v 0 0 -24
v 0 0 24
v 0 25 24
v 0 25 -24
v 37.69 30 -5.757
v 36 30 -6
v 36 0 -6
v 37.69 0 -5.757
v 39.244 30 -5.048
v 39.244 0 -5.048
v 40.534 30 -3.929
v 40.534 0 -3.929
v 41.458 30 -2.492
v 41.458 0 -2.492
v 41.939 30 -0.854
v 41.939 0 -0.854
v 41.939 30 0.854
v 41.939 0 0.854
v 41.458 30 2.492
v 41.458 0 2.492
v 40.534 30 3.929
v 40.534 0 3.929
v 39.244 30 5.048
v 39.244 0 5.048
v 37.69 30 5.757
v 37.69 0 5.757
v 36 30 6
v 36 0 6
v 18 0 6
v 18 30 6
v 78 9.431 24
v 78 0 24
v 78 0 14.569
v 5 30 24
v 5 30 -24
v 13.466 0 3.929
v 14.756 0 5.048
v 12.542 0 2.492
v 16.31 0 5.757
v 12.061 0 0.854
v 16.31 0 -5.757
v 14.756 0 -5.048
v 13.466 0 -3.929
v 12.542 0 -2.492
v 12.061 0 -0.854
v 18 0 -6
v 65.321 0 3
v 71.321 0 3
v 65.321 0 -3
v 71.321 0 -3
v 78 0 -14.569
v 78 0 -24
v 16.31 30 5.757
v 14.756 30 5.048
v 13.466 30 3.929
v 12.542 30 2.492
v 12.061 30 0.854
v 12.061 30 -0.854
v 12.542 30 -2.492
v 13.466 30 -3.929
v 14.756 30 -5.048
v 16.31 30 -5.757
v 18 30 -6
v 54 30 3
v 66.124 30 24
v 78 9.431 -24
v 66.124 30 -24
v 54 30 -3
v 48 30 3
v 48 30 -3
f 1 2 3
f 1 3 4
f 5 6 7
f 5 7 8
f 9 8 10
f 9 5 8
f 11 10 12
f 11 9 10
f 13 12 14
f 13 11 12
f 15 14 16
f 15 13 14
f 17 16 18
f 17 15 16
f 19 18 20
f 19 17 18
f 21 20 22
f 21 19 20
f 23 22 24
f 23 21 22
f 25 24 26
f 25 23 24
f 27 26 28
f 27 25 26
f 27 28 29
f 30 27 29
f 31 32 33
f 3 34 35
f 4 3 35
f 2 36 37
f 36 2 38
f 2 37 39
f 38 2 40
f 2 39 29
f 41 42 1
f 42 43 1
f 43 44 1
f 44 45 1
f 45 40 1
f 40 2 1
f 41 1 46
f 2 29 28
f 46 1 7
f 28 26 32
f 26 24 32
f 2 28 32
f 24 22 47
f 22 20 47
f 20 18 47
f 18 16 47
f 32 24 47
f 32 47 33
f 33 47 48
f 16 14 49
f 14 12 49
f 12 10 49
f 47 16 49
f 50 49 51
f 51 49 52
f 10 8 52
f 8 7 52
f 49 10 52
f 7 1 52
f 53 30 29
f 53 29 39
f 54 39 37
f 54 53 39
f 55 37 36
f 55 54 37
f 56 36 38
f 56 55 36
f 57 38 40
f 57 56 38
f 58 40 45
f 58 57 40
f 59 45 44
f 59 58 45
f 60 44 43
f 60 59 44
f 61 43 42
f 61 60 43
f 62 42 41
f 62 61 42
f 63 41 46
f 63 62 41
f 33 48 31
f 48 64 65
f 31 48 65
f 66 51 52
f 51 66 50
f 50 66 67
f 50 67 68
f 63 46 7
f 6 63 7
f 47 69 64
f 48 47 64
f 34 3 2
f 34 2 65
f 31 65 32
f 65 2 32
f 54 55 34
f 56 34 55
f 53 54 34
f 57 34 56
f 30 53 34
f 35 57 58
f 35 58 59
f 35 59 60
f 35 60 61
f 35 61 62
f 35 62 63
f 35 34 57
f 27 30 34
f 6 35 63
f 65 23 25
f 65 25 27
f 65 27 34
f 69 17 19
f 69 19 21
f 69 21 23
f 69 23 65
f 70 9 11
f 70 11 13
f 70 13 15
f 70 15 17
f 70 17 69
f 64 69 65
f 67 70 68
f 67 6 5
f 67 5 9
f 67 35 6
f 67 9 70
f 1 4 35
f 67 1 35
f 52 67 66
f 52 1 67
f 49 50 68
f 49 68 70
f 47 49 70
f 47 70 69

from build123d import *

# Parameters (mm, degrees)
SKETCH1_W           = 78
SKETCH1_H           = 48
BOSS_EXTRUDE1_DEPTH = 30
CHAMFER1_SIZE       = 5
CUT_EXTRUDE1_DEPTH  = 87.948260477
CUT_EXTRUDE2_DEPTH  = 101.553903722


with BuildPart() as part:
    # Sketch1 → Boss-Extrude1 (new body)
    with BuildSketch(Plane(origin=(0, 0, 0), x_dir=(1, 0, 0), z_dir=(0, 1, 0))):
        with Locations((39, 0)):
            Rectangle(SKETCH1_W, SKETCH1_H)
    extrude(amount=BOSS_EXTRUDE1_DEPTH)

    # Chamfer1
    chamfer1_edges = [part.edges().sort_by_distance(p)[0] for p in [
        (0, 30, 0),
    ]]
    chamfer(chamfer1_edges, length=CHAMFER1_SIZE)

    # Sketch2 → Cut-Extrude1 (cut, through all)
    with BuildSketch(Plane(origin=(0, 30, 0), x_dir=(1, 0, 0), z_dir=(0, 1, 0))):
        with BuildLine():
            Line((18, 6), (36, 6))
            ThreePointArc((36, 6), (42, 0), (36, -6))
            Line((36, -6), (18, -6))
            ThreePointArc((18, -6), (12, 0), (18, 6))
        make_face()
    extrude(amount=-CUT_EXTRUDE1_DEPTH, mode=Mode.SUBTRACT)

    # Sketch3 → Cut-Extrude2 (cut, through all, along a direction that is not the sketch's normal)
    with BuildSketch(Plane(origin=(0, 30, 0), x_dir=(1, 0, 0), z_dir=(0, 1, 0))):
        Polygon((78, 24), (66.124355653, 24), (54, 3), (48, 3), (48, -3), (54, -3), (66.124355653, -24), (78, -24), align=None)
    extrude(amount=-CUT_EXTRUDE2_DEPTH, dir=(-0.5000000000000044, 0.8660254037844362, 0), mode=Mode.SUBTRACT)


solid = part.part
